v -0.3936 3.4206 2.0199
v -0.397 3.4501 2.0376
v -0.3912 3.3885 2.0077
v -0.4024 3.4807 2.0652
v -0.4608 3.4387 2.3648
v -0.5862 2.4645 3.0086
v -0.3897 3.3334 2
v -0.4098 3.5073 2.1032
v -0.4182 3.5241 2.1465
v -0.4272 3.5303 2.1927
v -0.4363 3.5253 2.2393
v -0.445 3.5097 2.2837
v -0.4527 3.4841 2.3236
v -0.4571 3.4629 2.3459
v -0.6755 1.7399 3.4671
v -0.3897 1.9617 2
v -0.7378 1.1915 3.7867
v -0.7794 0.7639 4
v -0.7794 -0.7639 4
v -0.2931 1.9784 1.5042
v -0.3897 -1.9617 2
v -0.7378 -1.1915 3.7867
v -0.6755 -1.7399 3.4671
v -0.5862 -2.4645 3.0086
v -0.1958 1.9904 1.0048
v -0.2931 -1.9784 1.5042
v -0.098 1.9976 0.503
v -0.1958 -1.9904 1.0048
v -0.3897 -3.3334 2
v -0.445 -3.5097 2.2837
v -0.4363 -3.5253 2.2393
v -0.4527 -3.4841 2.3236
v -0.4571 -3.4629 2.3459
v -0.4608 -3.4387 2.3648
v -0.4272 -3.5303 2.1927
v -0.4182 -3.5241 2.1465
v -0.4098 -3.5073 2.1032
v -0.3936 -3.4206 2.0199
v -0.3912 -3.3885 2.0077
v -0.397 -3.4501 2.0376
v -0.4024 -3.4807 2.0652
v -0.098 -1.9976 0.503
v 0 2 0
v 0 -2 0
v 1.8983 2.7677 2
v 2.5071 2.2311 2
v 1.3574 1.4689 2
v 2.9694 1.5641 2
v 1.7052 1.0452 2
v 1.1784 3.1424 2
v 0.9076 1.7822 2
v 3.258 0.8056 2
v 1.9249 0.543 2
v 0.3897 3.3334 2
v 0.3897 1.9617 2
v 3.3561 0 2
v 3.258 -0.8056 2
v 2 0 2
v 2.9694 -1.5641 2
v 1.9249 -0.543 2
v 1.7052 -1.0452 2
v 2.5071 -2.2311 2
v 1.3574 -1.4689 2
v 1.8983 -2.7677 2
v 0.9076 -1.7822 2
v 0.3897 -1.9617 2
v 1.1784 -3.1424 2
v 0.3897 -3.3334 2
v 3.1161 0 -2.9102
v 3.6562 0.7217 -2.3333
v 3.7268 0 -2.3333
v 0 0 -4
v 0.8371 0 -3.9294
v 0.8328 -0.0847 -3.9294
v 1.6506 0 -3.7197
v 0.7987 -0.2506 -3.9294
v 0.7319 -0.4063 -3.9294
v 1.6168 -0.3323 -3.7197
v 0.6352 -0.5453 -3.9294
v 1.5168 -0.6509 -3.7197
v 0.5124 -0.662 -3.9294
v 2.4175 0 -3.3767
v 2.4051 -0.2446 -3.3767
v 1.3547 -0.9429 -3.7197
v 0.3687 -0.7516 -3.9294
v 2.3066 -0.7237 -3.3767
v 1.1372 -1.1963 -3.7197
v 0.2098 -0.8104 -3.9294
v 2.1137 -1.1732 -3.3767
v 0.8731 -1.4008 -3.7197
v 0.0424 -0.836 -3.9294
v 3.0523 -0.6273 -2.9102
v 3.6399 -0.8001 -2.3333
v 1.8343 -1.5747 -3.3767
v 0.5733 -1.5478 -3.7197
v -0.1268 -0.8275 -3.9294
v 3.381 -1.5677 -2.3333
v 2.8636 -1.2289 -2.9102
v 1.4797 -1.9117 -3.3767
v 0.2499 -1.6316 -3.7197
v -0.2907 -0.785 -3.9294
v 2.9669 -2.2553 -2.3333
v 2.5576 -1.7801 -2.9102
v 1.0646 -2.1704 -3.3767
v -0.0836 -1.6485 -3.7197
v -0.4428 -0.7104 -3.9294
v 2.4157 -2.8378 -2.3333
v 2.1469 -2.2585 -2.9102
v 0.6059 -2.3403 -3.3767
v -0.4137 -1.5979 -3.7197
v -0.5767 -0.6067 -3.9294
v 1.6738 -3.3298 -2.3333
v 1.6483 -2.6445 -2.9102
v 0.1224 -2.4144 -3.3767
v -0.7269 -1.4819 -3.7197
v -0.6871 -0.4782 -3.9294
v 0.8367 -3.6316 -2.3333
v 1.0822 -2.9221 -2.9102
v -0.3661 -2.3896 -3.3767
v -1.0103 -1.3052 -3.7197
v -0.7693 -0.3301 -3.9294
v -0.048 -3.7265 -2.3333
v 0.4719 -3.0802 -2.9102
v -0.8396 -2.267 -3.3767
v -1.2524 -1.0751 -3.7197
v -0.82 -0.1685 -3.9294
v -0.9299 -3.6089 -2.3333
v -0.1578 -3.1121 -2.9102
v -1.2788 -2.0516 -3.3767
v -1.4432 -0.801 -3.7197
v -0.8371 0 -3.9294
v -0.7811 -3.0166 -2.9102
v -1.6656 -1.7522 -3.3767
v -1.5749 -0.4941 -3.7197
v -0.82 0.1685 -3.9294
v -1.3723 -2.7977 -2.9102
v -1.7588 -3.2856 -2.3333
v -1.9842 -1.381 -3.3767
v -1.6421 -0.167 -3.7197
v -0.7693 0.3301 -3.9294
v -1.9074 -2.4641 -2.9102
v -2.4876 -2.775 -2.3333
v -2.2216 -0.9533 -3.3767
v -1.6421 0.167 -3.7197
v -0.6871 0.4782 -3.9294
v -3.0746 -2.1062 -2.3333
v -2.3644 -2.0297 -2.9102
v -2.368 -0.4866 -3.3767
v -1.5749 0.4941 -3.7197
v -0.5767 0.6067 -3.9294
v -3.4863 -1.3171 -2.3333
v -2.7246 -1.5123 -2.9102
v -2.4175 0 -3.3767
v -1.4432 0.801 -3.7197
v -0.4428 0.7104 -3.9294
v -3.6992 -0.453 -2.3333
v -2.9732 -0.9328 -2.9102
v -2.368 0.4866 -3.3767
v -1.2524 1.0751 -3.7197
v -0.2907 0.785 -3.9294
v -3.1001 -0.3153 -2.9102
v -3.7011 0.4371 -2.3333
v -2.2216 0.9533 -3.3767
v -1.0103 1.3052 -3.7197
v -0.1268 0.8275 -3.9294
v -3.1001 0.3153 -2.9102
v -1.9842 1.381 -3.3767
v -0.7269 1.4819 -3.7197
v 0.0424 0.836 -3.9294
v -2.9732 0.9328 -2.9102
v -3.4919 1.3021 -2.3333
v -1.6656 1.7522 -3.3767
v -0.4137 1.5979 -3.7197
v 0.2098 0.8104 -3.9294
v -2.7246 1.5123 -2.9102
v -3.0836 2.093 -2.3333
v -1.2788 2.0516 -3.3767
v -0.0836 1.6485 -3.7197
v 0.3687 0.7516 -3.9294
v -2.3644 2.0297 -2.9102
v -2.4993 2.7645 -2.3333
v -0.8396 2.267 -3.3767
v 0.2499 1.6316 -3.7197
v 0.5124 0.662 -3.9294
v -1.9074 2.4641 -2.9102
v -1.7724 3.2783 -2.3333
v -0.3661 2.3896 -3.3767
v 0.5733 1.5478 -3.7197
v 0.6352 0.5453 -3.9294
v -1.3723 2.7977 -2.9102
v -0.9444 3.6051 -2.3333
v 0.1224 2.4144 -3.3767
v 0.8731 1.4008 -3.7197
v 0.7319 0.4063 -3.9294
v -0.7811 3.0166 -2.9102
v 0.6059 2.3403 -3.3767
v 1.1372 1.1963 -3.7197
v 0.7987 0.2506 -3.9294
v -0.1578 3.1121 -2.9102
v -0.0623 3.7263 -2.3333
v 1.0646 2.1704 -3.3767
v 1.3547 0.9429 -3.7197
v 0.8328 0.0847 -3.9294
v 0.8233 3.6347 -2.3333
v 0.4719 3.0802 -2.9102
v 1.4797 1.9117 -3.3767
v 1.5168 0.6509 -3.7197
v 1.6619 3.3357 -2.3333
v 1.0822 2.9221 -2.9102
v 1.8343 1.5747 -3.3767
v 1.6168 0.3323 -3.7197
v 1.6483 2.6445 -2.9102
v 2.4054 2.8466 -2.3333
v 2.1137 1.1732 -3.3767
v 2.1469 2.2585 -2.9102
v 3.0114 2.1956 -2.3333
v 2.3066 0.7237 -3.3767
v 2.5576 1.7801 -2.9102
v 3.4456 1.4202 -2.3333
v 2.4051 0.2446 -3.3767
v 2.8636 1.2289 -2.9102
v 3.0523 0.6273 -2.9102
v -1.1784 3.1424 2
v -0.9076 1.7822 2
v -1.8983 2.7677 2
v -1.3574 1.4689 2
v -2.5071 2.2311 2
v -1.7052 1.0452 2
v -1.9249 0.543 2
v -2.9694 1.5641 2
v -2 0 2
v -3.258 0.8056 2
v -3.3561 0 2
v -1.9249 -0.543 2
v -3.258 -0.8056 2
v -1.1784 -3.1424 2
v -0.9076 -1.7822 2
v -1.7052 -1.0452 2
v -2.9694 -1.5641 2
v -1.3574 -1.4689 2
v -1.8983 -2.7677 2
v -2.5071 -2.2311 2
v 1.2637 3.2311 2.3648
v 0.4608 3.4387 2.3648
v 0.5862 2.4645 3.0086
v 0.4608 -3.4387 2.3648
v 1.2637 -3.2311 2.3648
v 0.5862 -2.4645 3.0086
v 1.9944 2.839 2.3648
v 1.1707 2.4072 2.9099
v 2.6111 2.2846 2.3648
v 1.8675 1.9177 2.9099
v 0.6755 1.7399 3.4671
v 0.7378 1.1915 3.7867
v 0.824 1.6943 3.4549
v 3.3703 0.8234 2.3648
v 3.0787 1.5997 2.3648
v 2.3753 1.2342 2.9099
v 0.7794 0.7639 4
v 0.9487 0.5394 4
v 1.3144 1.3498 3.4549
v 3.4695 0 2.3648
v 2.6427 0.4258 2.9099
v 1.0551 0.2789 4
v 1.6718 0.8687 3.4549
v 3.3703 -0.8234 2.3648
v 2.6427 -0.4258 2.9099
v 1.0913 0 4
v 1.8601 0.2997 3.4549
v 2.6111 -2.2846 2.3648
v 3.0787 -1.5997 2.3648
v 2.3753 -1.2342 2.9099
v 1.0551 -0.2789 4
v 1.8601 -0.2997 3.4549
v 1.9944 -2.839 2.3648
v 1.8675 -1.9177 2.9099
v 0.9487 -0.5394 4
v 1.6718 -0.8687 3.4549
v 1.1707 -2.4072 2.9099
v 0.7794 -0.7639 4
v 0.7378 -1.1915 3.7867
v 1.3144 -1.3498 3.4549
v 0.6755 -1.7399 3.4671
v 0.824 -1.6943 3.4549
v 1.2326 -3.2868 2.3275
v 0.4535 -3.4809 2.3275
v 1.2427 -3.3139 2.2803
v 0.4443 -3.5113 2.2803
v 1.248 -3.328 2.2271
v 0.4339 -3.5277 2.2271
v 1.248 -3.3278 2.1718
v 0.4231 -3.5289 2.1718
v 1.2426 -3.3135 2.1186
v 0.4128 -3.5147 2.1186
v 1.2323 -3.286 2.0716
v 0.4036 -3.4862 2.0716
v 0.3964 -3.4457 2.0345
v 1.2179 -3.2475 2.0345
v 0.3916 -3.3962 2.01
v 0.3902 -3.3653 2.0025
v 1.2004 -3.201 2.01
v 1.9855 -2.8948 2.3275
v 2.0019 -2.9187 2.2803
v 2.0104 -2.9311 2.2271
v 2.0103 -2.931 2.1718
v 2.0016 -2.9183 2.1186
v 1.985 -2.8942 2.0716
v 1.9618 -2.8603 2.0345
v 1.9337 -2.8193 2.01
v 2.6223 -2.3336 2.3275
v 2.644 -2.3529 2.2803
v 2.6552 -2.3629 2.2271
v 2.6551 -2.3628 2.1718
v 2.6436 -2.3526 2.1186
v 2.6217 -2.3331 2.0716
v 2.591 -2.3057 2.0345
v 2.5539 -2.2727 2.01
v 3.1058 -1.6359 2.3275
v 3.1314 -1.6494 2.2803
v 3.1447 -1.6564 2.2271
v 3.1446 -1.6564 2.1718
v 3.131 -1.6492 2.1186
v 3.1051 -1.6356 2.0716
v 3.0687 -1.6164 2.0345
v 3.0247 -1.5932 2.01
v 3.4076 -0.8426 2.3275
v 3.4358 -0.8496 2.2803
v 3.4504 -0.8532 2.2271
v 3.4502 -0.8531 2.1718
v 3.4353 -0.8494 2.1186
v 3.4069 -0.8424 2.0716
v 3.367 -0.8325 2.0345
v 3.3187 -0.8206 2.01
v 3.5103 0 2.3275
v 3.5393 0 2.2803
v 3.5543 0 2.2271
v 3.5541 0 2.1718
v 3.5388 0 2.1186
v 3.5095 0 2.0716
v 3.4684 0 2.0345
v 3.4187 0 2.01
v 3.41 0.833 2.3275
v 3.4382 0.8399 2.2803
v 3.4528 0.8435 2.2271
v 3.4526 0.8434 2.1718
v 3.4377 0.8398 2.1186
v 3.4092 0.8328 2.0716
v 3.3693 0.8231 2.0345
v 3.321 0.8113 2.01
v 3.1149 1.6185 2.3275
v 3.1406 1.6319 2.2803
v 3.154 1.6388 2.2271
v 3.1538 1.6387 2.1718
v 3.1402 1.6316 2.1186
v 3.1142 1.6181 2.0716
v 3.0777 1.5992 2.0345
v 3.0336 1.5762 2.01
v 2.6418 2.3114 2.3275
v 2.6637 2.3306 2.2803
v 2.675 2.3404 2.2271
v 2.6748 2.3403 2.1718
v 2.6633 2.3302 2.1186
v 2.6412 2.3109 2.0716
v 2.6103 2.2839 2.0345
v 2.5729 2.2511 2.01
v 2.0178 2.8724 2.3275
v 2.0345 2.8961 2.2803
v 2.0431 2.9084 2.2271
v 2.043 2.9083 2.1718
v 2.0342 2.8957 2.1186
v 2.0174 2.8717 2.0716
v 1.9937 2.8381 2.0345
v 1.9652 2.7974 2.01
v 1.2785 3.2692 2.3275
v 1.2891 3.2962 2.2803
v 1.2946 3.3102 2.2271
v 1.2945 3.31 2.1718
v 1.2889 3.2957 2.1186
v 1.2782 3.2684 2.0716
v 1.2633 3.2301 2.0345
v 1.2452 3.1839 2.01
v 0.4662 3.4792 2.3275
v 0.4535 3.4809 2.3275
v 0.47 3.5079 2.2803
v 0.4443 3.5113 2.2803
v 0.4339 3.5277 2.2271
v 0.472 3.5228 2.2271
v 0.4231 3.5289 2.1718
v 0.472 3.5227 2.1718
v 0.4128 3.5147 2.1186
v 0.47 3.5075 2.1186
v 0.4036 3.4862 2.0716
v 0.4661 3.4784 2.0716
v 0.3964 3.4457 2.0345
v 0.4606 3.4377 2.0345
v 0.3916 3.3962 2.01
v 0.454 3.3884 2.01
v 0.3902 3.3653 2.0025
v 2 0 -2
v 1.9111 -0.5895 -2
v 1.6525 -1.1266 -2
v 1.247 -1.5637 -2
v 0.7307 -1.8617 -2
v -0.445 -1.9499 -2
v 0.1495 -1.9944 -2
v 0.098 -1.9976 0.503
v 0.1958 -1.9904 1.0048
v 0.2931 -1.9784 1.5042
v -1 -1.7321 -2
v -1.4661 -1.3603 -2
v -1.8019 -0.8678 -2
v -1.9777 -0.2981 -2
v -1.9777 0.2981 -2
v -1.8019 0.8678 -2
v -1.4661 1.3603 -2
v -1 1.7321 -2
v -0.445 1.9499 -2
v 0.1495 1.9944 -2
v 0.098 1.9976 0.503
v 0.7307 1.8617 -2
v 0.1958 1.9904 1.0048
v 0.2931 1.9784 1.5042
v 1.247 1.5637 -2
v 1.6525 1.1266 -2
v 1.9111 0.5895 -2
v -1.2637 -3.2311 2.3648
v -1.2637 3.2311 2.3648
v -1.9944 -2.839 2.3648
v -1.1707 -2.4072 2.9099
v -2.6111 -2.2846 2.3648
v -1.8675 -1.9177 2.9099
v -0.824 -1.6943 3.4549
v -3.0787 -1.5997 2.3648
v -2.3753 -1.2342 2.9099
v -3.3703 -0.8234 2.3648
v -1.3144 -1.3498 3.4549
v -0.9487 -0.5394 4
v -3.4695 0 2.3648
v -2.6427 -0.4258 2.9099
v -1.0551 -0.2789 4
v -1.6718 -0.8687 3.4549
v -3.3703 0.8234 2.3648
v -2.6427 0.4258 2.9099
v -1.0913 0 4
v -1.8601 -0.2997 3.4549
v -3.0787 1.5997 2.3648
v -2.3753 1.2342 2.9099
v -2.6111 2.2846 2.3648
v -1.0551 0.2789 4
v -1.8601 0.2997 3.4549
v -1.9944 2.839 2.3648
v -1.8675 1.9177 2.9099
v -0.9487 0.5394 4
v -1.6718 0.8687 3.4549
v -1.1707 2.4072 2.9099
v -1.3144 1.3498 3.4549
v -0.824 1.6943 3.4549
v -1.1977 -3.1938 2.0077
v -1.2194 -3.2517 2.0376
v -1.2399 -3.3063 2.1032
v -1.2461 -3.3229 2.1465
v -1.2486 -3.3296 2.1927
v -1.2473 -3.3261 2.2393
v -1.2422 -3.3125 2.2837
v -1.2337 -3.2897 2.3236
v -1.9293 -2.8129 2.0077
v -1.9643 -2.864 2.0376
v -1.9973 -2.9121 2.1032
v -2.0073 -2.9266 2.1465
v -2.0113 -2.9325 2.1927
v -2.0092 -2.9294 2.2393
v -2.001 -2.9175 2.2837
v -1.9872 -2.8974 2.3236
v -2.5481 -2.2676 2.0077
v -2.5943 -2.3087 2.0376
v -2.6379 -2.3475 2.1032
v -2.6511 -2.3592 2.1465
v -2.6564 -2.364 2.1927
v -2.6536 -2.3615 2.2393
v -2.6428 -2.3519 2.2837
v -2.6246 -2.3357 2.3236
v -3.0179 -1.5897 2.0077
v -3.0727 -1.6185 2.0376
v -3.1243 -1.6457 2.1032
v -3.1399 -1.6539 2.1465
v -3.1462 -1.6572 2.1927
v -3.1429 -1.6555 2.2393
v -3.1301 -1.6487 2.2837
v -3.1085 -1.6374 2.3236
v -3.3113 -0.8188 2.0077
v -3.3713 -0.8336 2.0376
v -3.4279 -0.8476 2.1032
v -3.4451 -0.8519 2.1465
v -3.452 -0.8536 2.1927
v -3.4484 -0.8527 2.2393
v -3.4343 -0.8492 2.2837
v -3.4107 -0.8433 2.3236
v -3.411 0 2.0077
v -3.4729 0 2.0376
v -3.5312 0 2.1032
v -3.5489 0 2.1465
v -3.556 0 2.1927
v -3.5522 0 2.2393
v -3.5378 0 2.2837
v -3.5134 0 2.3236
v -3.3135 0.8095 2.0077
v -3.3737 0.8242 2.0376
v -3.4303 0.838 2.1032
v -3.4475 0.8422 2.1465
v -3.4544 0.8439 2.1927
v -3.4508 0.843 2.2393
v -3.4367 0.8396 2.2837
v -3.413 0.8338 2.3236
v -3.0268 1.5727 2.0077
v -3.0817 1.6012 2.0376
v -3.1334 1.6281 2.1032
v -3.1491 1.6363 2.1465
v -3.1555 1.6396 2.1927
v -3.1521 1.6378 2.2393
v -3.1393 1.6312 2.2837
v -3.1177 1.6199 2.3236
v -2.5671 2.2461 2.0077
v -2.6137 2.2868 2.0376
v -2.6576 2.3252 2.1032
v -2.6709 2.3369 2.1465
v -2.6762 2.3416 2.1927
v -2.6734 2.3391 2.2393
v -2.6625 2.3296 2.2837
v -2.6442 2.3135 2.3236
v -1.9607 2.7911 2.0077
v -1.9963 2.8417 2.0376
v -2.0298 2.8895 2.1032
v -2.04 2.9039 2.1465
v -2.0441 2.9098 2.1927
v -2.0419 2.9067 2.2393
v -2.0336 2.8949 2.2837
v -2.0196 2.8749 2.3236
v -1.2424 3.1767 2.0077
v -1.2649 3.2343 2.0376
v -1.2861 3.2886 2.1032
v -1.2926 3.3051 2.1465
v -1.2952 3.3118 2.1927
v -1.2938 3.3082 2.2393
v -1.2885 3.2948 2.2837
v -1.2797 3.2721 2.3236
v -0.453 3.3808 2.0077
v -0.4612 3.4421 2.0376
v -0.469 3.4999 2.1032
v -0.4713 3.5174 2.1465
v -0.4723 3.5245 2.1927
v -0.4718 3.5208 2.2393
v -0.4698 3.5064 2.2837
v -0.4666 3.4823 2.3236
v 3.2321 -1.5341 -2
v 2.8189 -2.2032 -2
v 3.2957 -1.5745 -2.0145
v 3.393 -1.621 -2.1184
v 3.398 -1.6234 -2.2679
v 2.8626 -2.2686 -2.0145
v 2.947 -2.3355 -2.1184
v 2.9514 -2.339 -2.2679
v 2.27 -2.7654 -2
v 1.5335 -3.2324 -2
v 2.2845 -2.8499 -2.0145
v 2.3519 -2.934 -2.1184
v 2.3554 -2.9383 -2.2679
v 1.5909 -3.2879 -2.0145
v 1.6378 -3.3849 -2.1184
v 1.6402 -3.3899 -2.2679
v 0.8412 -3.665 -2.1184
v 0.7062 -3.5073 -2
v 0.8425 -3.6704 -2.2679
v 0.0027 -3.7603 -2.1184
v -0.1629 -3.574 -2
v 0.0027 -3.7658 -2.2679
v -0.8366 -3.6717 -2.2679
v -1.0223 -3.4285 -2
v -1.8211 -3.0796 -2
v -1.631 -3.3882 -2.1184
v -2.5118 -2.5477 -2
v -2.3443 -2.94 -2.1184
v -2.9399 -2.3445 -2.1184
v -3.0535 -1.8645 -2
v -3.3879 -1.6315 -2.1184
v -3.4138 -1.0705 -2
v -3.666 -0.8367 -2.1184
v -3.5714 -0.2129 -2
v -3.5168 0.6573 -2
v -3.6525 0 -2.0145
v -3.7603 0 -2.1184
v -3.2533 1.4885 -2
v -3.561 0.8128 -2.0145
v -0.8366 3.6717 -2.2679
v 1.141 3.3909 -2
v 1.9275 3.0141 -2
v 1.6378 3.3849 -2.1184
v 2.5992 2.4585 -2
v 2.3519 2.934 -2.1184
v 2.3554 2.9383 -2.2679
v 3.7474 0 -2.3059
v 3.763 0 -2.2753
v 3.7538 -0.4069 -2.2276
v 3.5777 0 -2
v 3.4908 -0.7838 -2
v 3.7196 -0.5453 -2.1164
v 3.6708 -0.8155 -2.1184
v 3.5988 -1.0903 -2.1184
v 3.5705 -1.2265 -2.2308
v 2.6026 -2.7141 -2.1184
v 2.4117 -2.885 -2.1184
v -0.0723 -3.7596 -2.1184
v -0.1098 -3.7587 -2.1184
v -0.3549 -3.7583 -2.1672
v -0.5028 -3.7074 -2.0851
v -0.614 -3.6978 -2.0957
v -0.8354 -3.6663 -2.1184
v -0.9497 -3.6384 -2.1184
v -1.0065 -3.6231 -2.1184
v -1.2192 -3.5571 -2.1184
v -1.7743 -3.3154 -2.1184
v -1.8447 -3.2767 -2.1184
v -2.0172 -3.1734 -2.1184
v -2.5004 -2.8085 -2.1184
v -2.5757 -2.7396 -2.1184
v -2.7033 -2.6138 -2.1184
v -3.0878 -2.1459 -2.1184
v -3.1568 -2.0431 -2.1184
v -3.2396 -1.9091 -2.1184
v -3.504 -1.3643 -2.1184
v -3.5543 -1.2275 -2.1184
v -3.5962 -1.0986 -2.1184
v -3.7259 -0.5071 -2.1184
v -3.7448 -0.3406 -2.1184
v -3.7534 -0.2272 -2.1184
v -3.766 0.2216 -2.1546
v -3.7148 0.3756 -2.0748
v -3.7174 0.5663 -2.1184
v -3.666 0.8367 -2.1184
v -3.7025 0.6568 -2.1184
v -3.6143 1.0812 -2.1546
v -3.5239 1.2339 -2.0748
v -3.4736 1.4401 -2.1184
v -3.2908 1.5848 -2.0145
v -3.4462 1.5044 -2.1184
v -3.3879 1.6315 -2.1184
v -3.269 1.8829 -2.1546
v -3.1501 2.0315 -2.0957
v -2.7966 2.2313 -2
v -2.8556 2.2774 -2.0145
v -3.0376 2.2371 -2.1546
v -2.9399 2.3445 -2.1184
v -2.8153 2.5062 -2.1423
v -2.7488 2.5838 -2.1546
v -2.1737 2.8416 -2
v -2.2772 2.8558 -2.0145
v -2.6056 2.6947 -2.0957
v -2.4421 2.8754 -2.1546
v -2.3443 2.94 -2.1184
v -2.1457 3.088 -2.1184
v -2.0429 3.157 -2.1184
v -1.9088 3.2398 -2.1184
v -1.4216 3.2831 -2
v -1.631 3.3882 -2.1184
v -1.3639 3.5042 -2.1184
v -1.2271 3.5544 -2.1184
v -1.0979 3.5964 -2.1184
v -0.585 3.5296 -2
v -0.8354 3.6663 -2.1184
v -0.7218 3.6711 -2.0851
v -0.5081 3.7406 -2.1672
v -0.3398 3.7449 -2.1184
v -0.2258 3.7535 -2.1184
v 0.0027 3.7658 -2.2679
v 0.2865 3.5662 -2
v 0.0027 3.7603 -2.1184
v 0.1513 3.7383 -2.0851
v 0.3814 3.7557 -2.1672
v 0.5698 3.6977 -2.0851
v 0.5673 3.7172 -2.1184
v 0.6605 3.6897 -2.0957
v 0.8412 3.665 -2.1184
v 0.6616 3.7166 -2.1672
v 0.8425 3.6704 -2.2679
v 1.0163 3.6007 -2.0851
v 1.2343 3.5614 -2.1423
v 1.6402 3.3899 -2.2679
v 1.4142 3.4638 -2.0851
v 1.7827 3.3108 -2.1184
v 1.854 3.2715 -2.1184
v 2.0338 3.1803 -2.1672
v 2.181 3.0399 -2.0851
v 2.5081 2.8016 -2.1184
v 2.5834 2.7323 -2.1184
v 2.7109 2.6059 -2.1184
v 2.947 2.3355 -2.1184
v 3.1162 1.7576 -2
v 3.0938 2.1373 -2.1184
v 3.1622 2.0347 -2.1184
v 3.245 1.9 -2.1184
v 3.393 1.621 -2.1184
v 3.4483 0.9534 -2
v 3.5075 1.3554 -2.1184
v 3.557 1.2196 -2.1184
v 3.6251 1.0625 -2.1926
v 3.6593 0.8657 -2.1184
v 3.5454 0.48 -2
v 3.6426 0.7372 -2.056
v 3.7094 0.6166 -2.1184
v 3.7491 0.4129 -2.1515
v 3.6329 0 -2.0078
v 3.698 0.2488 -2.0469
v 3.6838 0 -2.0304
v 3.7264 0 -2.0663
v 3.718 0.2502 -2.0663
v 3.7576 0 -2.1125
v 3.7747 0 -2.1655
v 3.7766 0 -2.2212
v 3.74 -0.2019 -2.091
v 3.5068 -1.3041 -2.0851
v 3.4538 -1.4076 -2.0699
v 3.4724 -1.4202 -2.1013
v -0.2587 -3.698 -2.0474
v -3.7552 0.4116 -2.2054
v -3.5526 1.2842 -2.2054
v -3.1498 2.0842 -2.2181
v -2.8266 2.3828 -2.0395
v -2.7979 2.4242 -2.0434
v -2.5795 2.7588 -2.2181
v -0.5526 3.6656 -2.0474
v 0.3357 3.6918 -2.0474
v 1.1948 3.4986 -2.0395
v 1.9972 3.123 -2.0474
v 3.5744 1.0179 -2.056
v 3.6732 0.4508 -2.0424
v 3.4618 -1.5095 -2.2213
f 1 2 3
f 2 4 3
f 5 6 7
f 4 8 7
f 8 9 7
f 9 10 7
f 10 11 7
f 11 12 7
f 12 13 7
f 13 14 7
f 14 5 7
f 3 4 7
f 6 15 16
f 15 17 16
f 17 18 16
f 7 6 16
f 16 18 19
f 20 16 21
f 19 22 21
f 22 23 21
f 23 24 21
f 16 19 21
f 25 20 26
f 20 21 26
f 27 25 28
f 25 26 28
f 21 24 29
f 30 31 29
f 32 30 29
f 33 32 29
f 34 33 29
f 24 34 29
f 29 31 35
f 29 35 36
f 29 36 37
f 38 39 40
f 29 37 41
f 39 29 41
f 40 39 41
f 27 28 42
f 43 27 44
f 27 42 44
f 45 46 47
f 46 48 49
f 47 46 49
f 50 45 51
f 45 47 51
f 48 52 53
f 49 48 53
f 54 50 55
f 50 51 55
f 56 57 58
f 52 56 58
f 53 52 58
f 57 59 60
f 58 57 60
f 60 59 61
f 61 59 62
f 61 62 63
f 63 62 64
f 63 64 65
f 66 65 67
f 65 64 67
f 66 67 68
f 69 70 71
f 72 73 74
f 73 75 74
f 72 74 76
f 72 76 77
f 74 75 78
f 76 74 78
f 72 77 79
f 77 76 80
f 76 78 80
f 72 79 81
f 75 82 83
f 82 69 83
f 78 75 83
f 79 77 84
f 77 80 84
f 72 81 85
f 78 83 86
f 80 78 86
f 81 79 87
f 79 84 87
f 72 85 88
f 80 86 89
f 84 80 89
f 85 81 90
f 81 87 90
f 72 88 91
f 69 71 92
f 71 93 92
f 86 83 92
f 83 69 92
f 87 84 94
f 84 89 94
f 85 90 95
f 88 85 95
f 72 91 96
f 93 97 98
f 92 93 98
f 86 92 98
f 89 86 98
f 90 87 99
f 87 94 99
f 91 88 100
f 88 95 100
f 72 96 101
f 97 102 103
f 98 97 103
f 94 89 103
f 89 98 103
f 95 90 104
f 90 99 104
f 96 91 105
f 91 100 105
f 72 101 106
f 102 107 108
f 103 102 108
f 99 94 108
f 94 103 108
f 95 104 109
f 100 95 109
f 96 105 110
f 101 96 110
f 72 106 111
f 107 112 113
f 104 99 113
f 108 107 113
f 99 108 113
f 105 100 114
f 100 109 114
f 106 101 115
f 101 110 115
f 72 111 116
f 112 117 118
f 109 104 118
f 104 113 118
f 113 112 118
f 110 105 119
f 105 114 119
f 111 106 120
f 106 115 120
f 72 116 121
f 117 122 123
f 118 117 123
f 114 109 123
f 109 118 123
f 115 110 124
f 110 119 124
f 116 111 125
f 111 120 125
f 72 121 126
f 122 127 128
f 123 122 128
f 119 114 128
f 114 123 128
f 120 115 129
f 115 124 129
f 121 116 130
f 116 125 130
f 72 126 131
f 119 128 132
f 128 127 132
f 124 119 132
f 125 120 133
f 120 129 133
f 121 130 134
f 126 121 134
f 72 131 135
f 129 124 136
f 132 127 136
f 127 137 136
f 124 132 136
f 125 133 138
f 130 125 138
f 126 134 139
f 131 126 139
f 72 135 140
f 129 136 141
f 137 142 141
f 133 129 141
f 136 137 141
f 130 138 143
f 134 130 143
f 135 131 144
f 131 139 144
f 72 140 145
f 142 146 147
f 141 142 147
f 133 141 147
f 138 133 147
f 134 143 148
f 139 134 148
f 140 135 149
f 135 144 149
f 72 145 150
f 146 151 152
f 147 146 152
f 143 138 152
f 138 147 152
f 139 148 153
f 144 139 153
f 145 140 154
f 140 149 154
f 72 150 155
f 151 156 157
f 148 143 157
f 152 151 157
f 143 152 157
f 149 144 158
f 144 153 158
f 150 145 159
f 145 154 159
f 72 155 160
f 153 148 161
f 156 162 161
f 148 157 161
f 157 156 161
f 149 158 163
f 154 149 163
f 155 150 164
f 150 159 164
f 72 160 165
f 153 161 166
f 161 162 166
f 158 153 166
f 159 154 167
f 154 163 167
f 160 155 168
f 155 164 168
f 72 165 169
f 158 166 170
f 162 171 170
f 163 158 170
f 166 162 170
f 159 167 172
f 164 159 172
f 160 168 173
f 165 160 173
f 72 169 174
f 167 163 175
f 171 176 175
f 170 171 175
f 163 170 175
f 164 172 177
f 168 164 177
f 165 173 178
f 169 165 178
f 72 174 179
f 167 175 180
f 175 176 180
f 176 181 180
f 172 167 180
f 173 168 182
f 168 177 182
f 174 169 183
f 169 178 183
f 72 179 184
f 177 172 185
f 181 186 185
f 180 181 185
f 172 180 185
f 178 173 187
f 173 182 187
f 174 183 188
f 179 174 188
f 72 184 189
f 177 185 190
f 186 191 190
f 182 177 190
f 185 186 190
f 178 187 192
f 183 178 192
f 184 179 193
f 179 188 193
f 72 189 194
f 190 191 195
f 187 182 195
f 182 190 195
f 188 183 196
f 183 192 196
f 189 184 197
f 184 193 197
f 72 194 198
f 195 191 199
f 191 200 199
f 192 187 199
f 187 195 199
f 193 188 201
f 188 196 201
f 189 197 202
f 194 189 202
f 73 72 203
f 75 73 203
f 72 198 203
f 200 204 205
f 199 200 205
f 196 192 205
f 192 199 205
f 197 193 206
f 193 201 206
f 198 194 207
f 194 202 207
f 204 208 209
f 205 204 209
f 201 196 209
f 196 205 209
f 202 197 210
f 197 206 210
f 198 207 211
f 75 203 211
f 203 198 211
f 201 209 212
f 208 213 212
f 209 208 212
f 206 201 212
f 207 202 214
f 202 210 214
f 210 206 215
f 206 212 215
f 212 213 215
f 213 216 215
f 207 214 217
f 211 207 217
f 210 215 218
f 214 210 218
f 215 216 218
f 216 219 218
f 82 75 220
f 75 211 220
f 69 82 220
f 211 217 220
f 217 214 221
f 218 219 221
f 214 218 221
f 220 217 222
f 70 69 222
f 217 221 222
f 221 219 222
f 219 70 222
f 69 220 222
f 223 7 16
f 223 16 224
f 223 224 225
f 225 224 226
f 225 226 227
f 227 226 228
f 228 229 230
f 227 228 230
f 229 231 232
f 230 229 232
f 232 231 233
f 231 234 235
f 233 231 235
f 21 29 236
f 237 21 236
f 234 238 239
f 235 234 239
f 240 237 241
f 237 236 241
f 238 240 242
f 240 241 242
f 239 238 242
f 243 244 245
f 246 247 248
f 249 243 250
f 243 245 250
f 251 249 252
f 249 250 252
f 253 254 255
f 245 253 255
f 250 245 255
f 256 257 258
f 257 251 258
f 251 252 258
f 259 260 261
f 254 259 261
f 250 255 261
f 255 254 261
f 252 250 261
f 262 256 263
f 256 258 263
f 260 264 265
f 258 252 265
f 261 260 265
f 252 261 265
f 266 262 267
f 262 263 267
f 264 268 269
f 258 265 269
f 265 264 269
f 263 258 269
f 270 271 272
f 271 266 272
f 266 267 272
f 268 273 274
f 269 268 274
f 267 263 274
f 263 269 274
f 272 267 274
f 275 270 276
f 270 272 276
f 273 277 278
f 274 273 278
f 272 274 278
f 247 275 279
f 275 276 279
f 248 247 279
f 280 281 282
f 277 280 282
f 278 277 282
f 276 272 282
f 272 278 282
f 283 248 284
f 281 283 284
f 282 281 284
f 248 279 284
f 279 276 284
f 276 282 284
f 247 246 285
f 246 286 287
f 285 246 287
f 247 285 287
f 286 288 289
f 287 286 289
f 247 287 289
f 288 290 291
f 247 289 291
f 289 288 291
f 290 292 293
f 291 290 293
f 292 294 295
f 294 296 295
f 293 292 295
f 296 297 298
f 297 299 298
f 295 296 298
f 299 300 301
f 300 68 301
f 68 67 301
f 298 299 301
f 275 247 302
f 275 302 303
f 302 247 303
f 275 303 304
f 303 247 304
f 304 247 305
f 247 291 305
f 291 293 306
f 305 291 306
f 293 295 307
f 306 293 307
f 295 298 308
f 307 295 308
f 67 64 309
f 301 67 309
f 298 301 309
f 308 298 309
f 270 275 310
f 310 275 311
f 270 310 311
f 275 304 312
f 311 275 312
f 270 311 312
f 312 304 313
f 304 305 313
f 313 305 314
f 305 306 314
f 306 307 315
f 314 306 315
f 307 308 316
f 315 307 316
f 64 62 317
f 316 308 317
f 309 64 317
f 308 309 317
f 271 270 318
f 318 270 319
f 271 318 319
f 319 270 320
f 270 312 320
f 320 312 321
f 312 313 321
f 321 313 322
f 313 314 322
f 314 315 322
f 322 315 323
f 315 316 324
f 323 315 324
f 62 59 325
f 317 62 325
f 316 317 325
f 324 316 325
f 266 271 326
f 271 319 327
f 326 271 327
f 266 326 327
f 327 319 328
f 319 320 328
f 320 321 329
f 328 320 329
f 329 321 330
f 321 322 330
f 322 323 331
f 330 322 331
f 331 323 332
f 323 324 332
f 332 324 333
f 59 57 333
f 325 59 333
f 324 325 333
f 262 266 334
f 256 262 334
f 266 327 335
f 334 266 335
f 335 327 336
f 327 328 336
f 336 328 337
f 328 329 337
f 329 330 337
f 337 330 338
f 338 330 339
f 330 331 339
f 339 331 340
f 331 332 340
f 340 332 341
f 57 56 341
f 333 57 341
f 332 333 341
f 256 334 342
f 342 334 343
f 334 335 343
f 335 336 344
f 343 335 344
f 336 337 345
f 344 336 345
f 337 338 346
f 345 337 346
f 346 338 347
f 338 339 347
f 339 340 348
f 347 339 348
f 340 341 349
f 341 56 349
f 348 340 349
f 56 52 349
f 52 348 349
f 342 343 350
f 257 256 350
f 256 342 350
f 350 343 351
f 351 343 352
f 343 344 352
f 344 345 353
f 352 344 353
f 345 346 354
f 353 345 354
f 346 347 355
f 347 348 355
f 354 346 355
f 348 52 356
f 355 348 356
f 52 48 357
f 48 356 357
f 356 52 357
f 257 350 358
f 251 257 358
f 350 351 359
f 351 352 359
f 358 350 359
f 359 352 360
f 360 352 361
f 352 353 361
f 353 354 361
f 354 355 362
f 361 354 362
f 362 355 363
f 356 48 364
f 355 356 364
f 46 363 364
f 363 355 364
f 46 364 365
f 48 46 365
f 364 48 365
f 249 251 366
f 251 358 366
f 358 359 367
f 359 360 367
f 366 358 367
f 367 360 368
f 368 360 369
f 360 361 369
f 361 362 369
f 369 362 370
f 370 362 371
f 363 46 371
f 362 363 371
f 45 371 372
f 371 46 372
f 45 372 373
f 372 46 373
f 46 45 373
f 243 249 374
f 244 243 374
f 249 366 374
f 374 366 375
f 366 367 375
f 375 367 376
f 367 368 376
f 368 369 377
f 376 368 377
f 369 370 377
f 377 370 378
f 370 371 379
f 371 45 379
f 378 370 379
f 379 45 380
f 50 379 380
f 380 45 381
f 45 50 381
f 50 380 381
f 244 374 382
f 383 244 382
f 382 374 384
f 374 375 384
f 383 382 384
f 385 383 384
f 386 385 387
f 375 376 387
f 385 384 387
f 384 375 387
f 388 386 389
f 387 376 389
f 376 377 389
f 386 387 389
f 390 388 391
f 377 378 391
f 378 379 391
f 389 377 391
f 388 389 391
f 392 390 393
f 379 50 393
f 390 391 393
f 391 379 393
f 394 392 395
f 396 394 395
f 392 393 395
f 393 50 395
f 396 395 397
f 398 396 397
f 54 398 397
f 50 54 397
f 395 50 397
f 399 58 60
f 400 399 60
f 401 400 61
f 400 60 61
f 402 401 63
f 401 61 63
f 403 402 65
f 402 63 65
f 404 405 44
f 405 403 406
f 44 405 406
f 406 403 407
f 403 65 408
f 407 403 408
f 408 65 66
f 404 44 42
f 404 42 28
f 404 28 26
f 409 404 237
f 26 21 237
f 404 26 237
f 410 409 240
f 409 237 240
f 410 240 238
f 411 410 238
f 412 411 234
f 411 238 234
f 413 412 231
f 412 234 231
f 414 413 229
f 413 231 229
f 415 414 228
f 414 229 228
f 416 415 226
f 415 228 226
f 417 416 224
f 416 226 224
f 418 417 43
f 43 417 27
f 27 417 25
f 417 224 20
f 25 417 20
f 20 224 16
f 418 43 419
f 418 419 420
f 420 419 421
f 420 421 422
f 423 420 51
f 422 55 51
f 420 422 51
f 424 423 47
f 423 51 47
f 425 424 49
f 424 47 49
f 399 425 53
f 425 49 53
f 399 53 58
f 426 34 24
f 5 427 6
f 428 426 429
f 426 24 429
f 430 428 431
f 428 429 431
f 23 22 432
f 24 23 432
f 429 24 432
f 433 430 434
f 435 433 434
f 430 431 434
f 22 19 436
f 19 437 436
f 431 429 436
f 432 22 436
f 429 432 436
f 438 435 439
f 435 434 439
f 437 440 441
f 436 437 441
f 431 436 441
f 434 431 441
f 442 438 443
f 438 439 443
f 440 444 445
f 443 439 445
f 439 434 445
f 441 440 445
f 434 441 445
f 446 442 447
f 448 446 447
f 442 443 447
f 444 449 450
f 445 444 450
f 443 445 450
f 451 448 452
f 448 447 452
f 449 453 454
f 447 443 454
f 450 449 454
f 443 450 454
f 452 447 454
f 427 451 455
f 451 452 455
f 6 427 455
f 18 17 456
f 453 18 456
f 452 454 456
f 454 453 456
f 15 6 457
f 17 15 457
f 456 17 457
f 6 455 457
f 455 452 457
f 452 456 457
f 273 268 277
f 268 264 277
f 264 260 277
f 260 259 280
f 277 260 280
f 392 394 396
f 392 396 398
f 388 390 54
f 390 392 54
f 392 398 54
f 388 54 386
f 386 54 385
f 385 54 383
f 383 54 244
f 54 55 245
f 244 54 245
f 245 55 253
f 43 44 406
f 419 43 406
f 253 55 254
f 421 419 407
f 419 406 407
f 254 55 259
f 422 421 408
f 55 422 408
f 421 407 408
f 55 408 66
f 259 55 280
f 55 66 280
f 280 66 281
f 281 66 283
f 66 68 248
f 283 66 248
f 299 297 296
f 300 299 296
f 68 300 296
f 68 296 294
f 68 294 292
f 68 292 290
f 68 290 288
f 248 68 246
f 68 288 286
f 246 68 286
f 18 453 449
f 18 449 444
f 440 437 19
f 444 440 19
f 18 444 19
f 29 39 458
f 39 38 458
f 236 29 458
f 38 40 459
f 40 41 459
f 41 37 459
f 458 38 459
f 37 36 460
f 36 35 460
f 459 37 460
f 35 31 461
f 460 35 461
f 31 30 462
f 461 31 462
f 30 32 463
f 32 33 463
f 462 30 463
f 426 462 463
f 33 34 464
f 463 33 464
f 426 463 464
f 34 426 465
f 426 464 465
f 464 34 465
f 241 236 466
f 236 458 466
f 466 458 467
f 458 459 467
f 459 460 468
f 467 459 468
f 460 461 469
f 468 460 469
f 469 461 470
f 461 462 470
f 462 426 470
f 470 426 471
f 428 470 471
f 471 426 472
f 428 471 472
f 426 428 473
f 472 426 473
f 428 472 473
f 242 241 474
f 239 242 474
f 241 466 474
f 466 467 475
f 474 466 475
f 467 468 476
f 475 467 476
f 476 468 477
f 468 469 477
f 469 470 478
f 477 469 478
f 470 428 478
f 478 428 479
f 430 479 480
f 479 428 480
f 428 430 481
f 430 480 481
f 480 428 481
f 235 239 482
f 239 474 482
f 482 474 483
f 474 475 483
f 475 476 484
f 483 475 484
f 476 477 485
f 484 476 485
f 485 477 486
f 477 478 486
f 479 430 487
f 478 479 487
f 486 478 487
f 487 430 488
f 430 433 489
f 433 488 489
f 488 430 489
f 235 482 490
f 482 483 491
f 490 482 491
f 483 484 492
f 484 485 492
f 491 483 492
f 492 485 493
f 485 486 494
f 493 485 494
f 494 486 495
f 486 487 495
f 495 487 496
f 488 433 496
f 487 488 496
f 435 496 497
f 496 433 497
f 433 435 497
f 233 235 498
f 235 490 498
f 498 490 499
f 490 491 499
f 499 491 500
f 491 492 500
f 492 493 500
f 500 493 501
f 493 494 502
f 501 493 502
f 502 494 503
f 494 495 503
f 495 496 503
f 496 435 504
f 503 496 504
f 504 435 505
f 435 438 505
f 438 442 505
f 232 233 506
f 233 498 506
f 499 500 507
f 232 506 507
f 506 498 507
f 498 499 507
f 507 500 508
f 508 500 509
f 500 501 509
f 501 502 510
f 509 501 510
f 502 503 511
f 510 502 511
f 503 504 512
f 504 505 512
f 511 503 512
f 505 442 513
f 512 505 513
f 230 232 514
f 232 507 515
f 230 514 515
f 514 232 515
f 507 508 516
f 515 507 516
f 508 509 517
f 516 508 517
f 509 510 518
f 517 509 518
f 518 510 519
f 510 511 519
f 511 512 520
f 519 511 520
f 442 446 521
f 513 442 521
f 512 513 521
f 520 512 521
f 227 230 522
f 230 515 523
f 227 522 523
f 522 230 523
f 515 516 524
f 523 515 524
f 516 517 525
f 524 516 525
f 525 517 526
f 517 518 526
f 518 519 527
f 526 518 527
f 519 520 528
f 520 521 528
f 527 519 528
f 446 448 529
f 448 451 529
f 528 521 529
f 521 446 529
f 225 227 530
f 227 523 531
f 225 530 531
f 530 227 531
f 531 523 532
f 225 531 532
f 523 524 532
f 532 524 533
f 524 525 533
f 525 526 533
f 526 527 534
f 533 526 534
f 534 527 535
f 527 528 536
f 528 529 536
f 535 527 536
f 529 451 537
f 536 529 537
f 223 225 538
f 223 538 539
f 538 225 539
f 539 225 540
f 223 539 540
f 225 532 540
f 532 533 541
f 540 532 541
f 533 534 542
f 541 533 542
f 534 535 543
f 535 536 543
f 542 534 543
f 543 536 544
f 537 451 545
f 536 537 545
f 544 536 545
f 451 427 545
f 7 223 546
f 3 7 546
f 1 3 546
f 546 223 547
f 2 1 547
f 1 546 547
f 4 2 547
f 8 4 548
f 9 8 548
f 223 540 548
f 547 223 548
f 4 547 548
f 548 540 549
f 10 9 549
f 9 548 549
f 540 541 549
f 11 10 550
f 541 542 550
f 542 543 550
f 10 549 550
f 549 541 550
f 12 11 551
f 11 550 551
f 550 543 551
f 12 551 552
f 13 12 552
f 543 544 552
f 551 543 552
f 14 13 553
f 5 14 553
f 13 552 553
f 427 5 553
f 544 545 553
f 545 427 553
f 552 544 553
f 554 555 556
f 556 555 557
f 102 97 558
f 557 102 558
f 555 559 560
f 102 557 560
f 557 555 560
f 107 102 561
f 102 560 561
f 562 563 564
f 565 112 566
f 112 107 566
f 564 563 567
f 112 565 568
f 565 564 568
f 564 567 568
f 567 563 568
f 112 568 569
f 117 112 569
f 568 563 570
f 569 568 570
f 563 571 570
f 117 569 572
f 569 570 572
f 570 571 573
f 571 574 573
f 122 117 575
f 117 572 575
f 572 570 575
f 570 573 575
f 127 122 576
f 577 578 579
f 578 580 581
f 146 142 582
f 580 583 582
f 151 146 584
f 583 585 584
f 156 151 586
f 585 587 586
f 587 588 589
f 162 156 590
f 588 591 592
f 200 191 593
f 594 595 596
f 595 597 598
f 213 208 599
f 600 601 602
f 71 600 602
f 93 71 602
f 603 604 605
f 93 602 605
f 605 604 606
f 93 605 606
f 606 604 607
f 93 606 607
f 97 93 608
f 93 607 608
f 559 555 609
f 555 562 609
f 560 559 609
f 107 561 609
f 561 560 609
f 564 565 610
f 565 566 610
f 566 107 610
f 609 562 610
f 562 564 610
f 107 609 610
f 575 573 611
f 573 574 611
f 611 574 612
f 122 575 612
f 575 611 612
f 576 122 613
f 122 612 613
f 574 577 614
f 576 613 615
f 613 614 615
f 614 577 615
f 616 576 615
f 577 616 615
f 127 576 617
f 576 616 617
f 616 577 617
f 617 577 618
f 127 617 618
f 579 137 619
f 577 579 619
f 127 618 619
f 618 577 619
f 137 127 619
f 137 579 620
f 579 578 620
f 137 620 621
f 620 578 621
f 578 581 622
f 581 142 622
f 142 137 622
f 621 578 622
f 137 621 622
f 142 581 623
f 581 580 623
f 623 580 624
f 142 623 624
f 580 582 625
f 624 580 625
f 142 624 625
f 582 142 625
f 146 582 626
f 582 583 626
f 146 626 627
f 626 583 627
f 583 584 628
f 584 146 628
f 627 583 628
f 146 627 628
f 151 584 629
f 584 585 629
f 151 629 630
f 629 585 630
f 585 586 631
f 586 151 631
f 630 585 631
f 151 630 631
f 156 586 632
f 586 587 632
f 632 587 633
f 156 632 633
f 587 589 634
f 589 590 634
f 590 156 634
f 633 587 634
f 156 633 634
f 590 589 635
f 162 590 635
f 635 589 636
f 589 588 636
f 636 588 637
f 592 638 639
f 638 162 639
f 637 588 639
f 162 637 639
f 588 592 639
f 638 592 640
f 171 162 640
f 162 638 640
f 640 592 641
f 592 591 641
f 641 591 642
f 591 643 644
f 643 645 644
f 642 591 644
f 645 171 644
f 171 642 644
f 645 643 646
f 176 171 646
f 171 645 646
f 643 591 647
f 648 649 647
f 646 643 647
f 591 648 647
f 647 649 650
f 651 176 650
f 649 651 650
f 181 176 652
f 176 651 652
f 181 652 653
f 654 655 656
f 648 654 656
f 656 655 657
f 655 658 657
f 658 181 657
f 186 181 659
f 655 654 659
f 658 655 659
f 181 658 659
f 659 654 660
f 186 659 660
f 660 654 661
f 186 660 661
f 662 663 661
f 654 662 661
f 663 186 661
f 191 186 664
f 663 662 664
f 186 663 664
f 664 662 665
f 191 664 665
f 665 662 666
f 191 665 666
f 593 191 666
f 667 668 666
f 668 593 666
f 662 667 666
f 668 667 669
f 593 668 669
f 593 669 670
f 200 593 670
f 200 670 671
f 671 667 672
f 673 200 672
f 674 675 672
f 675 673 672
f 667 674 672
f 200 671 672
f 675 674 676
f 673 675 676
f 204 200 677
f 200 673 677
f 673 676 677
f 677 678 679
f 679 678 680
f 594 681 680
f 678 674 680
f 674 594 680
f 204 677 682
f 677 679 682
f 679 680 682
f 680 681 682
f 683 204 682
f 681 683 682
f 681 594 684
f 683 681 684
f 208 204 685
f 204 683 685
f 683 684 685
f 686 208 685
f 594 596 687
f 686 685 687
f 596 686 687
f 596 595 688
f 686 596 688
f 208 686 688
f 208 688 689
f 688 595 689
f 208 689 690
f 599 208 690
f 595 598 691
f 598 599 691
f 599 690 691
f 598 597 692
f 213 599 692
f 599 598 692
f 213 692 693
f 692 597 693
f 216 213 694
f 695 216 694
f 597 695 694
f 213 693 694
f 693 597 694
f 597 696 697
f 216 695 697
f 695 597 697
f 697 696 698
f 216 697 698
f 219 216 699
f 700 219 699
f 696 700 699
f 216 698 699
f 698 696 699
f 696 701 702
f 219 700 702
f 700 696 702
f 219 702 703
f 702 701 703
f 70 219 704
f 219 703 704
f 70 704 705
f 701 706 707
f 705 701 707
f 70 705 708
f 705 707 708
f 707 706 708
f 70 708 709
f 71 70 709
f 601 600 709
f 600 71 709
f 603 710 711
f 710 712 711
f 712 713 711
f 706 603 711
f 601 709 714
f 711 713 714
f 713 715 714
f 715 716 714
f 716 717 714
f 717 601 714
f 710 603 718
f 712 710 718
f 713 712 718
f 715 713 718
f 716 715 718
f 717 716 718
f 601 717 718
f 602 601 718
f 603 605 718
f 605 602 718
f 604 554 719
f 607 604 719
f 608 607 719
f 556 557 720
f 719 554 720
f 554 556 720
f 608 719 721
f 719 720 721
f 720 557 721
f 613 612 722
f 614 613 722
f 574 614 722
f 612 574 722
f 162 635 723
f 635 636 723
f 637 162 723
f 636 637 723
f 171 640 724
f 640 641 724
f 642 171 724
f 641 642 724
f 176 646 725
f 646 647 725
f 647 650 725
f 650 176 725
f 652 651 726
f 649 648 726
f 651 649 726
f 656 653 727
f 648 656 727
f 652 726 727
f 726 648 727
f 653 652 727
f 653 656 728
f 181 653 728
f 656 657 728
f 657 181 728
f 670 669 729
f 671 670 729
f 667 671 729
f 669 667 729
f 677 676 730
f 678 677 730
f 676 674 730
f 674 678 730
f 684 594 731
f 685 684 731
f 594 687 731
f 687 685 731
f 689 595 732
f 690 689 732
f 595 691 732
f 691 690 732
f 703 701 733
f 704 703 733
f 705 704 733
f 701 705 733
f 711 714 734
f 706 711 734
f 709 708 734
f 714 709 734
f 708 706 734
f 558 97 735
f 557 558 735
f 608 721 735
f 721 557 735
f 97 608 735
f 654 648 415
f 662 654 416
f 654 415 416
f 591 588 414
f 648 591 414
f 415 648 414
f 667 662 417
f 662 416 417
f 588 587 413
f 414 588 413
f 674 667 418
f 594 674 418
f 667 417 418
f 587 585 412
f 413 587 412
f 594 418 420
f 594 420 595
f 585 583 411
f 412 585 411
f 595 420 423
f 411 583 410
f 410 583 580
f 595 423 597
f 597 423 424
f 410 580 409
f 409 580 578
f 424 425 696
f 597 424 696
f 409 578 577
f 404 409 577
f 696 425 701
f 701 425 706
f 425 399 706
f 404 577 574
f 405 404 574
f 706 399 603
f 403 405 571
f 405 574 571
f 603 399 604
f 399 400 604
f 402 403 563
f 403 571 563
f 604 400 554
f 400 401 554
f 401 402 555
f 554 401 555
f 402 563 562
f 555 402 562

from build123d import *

# Parameters (mm, degrees)
F3_DEPTH = 12.5
F4_R     = 0.2


with BuildPart() as f1:
    # F0 (on Front) → F1 (revolve)
    with BuildSketch(Plane.XZ):
        with BuildLine():
            Line((1.091340166, 4), (0.7793633606, 4))
            Line((0.7793633606, 4), (0, 2.1581007758))
            Line((0, 2.1581007758), (0, -4))
            ThreePointArc((0, -4), (2.2360679775, -3.472135955), (4, -2))
            Line((4, -2), (2, -2))
            Line((2, -2), (2, 0))
            Line((2, 0), (2, 2))
            Line((2, 2), (4, 2))
            Line((4, 2), (1.091340166, 4))
        make_face()
    revolve(axis=Axis((0, 0, 0), (0, 0, -1)))

    # F2 (on Front) → F3 (cut, symmetric)
    with BuildSketch(Plane.XZ):
        Polygon((0.7793633606, 4), (-0.7793633606, 4), (0, 0), align=None)
    extrude(amount=F3_DEPTH, both=True, mode=Mode.SUBTRACT)

    # F4
    f4_edges = [f1.edges().sort_by_distance(p)[0] for p in [
        (4, 0, 2),
        (-4, 0, 2),
        (-4, 0, -2),
    ]]
    fillet(f4_edges, radius=F4_R)


with BuildPart() as f5_1:
    # F5: copy of F1
    add(f1.part.moved(Location((-19.8, 0, -17.8))))


solid = f1.part
